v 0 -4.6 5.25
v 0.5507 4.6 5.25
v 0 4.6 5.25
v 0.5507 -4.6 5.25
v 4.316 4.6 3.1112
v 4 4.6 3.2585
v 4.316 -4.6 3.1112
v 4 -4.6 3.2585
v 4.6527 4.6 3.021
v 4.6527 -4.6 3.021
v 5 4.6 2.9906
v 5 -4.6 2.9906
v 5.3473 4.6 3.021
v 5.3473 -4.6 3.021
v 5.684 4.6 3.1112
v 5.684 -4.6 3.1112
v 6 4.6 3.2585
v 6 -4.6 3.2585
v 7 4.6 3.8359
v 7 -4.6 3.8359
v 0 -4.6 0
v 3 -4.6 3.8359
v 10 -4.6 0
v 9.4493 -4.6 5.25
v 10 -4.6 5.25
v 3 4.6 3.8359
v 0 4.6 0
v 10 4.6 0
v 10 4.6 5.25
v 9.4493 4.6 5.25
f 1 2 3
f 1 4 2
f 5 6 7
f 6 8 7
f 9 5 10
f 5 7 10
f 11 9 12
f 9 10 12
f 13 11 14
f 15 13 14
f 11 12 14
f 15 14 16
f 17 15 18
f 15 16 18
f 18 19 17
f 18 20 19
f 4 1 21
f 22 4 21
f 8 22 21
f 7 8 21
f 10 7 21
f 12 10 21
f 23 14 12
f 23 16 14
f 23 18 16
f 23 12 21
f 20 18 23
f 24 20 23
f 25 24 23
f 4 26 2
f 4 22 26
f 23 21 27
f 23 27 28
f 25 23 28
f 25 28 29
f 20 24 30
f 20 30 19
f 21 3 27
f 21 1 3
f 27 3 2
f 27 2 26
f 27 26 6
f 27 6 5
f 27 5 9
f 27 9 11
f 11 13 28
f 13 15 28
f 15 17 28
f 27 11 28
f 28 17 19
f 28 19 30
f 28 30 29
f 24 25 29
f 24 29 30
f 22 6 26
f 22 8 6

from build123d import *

# Parameters (mm, degrees)
F1_DEPTH = 4.6
F2_R     = 2


with BuildPart() as f1:
    # F0 (on Front) → F1 (new body, symmetric)
    with BuildSketch(Plane.XZ):
        Polygon((0, 5.25), (0, 0), (10, 0), (10, 5.25), (9.449296, 5.25), (7, 3.835898), (5, 2.681198), (3, 3.835898), (0.550704, 5.25), align=None)
    extrude(amount=F1_DEPTH, both=True)

    # F2
    f2_edges = [f1.edges().sort_by_distance(p)[0] for p in [
        (5, 0, 2.681198),
    ]]
    fillet(f2_edges, radius=F2_R)


solid = f1.part
